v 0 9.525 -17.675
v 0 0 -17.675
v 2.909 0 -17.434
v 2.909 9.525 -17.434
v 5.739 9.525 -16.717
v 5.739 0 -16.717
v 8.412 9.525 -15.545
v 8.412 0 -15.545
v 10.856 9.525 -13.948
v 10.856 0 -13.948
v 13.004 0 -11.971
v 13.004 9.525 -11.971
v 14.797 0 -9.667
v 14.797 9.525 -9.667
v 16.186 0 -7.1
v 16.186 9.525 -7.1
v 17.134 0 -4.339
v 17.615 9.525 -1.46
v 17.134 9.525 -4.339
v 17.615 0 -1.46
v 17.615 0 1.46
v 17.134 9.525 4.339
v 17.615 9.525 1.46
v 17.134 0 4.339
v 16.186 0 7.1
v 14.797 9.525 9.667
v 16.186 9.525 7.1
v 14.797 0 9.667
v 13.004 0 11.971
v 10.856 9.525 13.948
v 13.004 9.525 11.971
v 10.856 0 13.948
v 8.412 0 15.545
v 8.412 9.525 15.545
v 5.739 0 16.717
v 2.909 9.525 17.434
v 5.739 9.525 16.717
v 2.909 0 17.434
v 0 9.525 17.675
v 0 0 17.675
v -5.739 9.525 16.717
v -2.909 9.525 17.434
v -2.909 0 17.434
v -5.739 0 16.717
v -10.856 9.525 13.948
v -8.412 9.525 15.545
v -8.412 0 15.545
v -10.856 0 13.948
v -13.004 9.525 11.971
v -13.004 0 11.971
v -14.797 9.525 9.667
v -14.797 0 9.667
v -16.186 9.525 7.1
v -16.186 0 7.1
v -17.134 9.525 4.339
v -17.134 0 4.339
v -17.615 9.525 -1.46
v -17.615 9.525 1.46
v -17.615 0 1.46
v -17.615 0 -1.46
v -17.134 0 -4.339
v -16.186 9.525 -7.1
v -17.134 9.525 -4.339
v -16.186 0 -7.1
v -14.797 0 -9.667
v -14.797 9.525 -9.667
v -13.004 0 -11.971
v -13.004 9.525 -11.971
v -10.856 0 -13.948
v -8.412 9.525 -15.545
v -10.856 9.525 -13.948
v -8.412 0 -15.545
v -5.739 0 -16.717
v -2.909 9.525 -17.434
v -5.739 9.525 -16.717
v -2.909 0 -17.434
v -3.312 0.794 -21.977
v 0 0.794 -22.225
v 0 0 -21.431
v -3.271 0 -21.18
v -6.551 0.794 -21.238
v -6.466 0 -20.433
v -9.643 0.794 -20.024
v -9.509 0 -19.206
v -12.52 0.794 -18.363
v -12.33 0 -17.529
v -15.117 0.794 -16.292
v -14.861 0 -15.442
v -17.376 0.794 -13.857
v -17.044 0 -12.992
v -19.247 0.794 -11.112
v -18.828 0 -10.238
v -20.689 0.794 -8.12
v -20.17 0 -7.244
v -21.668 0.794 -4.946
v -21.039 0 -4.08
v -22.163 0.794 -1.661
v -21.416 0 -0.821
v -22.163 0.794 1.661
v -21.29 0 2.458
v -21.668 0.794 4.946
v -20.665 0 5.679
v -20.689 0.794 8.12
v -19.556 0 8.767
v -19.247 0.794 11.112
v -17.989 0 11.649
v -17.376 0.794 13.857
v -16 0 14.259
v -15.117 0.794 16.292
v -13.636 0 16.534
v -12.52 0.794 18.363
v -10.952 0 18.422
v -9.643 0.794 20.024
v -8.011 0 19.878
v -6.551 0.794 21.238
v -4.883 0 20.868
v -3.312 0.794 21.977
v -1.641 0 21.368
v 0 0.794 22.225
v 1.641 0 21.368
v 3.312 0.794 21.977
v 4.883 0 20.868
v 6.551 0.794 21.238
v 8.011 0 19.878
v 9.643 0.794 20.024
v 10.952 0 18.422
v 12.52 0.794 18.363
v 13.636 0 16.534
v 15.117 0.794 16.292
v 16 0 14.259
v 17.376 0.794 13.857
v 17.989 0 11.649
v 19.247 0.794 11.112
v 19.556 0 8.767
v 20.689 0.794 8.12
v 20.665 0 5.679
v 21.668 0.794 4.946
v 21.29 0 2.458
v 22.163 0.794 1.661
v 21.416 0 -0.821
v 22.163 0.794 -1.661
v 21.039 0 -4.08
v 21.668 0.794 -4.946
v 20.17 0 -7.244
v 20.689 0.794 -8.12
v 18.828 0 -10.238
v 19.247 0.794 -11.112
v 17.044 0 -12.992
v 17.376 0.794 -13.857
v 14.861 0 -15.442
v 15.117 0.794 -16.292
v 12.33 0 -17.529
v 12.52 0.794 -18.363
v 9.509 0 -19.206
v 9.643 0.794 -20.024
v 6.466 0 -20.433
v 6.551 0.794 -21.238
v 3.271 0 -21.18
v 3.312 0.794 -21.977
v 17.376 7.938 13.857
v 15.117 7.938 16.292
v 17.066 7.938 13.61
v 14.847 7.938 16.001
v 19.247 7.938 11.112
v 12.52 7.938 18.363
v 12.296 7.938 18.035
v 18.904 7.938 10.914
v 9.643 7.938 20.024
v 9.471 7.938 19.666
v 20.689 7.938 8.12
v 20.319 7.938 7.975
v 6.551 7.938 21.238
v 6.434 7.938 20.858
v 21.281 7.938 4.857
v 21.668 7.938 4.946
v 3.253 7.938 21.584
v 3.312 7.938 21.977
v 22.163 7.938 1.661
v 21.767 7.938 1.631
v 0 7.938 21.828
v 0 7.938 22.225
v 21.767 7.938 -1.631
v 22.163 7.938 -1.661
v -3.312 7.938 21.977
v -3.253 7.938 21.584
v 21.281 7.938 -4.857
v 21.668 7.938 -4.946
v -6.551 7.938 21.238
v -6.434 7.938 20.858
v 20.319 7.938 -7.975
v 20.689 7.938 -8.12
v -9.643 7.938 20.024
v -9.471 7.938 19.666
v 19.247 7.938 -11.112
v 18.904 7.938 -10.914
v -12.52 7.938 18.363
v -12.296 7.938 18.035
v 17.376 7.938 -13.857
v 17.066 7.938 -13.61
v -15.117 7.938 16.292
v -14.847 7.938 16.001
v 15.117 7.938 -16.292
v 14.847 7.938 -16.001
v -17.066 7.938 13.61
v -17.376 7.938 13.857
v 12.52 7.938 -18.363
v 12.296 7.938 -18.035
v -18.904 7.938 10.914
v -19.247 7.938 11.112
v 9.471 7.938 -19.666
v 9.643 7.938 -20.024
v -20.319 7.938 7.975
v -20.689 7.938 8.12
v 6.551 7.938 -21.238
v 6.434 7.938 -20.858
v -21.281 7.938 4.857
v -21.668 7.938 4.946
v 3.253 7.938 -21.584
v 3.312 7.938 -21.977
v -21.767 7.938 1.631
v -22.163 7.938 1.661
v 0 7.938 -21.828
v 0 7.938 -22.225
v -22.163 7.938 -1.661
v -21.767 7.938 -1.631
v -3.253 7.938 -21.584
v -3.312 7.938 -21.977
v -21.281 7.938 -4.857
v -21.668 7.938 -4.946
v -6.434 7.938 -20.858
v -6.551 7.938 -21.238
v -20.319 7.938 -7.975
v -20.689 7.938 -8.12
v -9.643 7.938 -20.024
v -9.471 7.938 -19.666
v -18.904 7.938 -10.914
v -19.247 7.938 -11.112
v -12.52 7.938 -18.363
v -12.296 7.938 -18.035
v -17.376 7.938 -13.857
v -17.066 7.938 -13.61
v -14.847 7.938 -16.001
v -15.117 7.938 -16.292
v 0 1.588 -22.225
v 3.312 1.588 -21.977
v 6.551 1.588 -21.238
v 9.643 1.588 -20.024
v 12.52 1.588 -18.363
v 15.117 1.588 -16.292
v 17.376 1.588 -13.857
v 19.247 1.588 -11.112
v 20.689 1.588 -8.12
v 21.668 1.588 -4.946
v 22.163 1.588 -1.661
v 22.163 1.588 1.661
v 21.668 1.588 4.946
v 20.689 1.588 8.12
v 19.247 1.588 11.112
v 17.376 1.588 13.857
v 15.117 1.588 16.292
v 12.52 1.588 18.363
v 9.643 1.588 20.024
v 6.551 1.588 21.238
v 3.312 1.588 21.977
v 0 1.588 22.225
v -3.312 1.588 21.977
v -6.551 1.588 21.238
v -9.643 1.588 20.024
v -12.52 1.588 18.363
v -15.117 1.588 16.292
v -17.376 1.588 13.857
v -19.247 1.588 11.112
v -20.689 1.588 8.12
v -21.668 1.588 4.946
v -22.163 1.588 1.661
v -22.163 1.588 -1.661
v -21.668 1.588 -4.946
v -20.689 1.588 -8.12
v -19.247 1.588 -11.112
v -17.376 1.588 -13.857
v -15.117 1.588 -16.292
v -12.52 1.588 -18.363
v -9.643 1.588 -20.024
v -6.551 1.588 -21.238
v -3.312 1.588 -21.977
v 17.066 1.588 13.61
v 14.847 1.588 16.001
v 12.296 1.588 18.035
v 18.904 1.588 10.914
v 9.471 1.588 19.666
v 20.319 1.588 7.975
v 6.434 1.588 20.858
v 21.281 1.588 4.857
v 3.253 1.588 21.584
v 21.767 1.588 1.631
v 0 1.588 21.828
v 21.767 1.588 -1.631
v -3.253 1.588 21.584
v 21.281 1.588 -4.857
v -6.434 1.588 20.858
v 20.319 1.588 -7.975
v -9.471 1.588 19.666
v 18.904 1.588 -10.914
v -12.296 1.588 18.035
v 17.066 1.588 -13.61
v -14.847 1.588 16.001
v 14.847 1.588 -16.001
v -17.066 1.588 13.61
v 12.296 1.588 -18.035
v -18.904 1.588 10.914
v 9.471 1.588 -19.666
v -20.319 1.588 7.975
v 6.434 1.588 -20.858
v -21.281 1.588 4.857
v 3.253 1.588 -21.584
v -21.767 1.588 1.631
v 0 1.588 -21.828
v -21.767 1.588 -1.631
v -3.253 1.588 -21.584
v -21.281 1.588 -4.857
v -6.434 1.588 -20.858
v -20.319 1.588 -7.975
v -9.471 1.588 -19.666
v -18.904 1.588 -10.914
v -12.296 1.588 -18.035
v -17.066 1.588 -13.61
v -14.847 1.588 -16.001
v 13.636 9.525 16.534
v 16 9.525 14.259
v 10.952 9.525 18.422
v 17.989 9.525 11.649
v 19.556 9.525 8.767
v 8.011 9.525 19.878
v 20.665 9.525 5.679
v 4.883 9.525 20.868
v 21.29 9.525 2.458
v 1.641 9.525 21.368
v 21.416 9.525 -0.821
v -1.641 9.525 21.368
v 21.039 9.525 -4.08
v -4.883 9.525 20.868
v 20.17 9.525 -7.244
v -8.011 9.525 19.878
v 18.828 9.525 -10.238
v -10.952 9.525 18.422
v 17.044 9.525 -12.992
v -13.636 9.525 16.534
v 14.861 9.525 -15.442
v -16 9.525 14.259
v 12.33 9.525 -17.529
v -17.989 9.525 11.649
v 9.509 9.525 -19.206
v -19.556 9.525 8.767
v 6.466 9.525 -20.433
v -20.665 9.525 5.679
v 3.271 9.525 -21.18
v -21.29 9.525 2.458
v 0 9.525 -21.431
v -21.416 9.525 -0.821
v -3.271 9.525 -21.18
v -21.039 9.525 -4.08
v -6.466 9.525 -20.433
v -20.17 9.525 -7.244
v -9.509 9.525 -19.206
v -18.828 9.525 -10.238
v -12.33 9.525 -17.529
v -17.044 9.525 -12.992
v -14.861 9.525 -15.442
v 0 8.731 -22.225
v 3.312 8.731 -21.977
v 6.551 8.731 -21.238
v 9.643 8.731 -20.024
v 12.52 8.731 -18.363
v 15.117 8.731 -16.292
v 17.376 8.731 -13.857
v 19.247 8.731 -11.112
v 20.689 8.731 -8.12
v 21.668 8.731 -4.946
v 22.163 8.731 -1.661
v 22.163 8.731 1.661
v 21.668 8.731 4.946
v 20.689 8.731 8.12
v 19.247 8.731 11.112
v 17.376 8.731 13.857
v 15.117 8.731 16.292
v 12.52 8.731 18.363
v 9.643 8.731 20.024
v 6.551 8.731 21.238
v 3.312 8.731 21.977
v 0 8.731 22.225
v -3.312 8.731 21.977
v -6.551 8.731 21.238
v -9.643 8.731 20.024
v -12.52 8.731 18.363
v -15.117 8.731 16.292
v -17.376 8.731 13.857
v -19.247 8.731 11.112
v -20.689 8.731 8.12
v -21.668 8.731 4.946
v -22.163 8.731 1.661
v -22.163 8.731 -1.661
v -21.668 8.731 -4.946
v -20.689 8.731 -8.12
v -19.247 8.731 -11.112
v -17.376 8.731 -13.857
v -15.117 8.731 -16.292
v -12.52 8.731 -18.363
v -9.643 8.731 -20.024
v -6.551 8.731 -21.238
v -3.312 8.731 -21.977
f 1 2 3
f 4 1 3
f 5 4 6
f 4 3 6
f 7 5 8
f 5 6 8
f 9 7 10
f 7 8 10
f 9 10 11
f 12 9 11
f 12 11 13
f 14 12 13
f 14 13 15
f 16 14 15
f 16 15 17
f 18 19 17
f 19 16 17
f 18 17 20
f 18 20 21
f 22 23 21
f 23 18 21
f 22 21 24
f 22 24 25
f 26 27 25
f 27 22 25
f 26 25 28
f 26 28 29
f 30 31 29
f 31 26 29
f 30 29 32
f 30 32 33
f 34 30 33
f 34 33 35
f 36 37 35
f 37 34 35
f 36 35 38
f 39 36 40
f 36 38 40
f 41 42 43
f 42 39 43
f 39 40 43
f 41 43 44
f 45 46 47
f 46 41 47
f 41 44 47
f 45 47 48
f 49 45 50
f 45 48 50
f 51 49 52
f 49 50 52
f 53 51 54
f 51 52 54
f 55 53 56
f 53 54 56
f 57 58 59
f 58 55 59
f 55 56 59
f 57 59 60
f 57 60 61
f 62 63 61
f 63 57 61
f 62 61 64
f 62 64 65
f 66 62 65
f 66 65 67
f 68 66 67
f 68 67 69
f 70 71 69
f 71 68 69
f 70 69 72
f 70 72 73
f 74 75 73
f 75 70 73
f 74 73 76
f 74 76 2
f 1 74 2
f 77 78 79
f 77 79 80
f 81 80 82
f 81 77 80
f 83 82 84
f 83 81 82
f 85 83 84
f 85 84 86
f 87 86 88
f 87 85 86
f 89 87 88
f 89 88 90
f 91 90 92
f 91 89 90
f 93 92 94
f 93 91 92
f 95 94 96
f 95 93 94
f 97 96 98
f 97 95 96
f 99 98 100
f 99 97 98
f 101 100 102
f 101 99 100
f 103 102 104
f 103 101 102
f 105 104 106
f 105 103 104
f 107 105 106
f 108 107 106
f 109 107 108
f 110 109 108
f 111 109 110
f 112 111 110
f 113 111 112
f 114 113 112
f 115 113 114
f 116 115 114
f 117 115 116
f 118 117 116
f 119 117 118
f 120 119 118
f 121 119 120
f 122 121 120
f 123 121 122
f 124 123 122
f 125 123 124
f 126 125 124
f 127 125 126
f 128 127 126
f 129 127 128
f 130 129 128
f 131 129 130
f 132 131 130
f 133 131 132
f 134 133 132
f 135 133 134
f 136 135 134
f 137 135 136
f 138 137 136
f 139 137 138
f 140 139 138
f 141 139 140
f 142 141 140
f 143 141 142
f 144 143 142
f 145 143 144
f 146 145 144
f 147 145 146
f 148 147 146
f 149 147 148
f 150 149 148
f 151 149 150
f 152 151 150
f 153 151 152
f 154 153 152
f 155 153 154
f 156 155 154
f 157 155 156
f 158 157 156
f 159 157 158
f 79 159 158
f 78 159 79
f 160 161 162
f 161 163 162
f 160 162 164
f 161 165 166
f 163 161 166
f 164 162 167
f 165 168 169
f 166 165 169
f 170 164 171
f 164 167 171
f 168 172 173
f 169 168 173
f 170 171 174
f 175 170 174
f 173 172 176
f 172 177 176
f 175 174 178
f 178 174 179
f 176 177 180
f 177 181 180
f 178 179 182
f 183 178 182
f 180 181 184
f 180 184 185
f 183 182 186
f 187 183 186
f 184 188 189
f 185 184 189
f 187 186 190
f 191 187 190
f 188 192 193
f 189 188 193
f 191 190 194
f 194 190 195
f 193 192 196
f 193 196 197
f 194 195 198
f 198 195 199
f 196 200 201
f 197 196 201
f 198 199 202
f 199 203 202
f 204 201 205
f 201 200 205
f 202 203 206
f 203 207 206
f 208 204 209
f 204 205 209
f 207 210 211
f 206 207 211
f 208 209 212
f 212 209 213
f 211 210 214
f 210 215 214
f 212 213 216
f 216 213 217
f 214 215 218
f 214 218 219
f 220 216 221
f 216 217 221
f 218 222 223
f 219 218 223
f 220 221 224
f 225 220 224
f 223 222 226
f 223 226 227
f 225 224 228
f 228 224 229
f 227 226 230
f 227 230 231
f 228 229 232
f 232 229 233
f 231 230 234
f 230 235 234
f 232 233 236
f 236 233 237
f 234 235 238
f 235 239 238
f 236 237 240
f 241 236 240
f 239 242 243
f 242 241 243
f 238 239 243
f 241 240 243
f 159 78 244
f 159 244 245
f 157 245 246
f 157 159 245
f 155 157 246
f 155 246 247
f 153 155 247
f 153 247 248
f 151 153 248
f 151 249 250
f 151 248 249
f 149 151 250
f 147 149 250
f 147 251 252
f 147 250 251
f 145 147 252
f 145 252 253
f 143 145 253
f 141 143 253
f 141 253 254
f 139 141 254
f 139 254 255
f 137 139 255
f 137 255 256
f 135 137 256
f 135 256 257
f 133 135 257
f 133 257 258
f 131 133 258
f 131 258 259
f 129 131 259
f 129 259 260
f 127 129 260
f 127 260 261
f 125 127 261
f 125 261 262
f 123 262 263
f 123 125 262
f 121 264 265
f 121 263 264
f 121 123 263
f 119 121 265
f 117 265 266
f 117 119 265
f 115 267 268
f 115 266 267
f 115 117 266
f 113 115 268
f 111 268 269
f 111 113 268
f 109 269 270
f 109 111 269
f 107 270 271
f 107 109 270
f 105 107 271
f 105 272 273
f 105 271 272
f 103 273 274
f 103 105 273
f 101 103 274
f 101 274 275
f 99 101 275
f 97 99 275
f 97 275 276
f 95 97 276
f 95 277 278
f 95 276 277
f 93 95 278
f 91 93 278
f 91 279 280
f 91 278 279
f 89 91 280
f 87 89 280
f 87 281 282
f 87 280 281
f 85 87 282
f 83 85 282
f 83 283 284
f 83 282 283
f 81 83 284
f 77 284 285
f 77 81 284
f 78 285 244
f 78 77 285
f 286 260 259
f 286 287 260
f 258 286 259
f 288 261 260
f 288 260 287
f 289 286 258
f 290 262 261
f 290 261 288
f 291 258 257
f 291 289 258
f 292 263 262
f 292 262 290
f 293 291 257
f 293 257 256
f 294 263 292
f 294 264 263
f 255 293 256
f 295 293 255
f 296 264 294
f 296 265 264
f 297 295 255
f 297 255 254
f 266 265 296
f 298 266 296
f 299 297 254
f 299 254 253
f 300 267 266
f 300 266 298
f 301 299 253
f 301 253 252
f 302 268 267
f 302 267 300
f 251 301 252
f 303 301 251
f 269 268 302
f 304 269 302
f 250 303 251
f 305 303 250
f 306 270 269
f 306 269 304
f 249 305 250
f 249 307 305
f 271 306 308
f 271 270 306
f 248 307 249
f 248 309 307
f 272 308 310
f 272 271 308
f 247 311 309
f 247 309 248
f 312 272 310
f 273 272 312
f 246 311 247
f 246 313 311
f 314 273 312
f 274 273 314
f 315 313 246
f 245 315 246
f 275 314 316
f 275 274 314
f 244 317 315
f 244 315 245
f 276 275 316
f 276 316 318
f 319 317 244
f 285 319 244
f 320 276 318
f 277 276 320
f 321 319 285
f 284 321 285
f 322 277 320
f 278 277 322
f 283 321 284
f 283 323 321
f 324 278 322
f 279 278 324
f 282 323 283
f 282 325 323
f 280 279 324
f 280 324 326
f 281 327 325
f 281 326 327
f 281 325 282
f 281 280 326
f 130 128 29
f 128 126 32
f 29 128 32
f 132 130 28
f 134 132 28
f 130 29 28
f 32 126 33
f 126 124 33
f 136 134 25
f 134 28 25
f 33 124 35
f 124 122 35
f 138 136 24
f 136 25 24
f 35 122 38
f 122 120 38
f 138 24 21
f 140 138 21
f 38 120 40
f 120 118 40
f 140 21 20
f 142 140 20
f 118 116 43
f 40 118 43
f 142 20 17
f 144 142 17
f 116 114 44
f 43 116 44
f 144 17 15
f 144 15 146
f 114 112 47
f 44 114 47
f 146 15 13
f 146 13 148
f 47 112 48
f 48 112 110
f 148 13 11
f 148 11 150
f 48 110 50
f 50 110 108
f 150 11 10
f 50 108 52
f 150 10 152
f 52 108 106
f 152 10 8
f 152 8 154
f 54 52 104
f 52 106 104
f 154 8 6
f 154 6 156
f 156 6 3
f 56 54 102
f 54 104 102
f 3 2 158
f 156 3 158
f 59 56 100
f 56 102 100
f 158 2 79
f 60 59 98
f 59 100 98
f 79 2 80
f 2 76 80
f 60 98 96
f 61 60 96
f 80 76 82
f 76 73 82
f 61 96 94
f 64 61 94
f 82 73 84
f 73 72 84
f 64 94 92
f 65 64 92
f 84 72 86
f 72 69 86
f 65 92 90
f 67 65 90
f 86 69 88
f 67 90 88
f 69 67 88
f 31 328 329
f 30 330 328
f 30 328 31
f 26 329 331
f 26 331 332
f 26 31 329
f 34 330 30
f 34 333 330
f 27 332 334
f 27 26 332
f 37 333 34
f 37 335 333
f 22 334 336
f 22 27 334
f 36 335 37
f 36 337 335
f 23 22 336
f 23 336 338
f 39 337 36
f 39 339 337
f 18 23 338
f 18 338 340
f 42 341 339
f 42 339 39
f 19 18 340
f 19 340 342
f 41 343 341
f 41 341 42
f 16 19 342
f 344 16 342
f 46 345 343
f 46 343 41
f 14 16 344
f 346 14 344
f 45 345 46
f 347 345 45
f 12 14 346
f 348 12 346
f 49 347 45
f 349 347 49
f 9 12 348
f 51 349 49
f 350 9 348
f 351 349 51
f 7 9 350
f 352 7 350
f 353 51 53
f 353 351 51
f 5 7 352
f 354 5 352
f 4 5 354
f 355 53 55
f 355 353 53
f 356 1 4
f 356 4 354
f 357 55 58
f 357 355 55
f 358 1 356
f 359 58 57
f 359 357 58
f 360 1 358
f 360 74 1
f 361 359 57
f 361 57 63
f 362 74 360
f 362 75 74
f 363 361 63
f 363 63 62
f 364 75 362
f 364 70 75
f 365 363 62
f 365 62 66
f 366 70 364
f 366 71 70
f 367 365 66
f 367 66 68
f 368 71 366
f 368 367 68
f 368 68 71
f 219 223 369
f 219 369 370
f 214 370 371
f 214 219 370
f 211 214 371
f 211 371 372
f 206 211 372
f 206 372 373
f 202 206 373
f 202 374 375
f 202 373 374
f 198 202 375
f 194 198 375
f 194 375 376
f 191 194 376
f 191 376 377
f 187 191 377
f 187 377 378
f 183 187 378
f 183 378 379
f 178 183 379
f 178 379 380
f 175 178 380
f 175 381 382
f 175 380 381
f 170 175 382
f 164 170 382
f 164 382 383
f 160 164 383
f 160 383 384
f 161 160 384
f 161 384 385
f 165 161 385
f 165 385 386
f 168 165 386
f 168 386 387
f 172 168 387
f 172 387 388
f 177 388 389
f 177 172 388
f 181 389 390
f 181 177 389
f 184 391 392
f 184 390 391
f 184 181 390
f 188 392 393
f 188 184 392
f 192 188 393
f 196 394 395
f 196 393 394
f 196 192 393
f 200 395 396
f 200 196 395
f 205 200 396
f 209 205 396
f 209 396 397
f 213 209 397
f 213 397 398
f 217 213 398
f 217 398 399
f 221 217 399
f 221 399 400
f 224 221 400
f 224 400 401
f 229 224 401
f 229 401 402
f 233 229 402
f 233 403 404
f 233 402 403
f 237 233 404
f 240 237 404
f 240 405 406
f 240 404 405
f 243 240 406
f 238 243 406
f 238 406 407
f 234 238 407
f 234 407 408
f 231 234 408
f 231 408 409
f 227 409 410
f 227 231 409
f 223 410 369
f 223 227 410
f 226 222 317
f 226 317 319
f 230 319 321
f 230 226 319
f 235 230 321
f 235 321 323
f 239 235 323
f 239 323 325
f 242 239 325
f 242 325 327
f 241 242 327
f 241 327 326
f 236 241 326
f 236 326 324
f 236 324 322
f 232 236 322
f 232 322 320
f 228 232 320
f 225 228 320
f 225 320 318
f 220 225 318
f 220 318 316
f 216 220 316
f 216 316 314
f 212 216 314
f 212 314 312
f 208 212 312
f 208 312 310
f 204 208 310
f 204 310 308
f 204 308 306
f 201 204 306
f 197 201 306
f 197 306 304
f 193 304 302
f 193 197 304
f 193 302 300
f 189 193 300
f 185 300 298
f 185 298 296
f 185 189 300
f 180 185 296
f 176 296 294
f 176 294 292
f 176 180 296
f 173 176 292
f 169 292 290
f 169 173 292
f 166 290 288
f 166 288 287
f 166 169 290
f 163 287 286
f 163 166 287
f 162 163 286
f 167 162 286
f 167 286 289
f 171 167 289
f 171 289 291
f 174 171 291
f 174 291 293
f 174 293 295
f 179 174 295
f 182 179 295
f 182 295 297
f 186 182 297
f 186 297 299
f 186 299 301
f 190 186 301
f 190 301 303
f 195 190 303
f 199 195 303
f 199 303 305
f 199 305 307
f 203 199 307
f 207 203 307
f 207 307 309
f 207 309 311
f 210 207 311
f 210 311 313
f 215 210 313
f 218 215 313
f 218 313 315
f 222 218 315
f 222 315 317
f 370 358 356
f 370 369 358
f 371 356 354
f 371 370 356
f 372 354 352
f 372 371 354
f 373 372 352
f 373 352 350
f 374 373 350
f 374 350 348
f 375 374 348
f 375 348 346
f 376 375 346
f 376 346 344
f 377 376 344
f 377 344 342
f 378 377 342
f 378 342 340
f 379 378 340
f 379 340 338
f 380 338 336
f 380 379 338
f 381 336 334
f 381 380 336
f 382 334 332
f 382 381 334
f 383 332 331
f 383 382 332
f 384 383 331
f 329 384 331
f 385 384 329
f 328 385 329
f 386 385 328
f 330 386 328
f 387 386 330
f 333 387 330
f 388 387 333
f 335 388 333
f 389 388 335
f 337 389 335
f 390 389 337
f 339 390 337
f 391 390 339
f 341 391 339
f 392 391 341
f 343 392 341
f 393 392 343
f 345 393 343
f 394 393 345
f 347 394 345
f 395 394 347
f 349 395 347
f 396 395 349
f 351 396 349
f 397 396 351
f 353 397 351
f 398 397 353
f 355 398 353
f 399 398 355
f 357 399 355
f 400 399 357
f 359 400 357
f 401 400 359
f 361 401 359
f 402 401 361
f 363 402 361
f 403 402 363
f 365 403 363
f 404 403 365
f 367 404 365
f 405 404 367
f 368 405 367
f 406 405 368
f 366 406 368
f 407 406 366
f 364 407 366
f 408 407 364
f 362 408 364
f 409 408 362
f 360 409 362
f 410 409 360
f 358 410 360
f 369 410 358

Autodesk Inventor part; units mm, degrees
ref_plane "YZ Plane" through (0, 0, 0) normal (1, 0, 0) x (0, 1, 0)
ref_plane "XZ Plane" through (0, 0, 0) normal (0, 1, 0) x (-1, 0, 0)
ref_plane "XY Plane" through (0, 0, 0) normal (0, 0, 1) x (1, 0, 0)
sketch "Sketch1" plane through (0, 0, 0) normal (1, 0, 0) x (0, 1, 0)
  line L0 (0, 0) -> (9.525, 0)
  line L1 (9.525, 0) -> (9.525, -17.675)
  line L2 (9.525, -17.675) -> (0, -17.675)
  line L3 (0, -17.675) -> (0, 0)
  line L4 (0, 0) -> (9.525, 0)
  line L5 (9.525, 0) -> (9.525, -22.225)
  line L6 (9.525, -22.225) -> (0, -22.225)
  line L7 (0, -22.225) -> (0, 0)
  line L8 (1.5875, -21.8281) -> (7.9375, -21.8281)
  line L9 (7.9375, -21.8281) -> (7.9375, -22.6219)
  line L10 (7.9375, -22.6219) -> (1.5875, -22.6219) construction
  line L11 (1.5875, -22.6219) -> (1.5875, -21.8281)
  line L12 (1.5875, -21.8281) -> (7.9375, -22.6219) construction
  line L13 (7.9375, -21.8281) -> (1.5875, -22.6219) construction
  point P0 (4.7625, -22.225)
  point P1 (7.9375, -22.225)
  point P2 (0, -17.675)
  point P3 (1.5875, -22.225)
  dimension "d0" = 17.675
  dimension "d1" = 9.525
  dimension "d2" = 22.225
  dimension "d3" = 6.35
  dimension "d4" = 0.7937
revolve "Revolution1" add sketch "Sketch1" angle 360 about axis through (0, 0, 0) along (0, 1, 0) contours L2 L5 L6 L9 L8 L11 L7
chamfer "Chamfer1" distance 0.7937 angle 45 2 edges at (0, 9.525, 22.225) (0, 0, 22.225)
properties part number "Band - Hub" material "Nylon 6/6"
